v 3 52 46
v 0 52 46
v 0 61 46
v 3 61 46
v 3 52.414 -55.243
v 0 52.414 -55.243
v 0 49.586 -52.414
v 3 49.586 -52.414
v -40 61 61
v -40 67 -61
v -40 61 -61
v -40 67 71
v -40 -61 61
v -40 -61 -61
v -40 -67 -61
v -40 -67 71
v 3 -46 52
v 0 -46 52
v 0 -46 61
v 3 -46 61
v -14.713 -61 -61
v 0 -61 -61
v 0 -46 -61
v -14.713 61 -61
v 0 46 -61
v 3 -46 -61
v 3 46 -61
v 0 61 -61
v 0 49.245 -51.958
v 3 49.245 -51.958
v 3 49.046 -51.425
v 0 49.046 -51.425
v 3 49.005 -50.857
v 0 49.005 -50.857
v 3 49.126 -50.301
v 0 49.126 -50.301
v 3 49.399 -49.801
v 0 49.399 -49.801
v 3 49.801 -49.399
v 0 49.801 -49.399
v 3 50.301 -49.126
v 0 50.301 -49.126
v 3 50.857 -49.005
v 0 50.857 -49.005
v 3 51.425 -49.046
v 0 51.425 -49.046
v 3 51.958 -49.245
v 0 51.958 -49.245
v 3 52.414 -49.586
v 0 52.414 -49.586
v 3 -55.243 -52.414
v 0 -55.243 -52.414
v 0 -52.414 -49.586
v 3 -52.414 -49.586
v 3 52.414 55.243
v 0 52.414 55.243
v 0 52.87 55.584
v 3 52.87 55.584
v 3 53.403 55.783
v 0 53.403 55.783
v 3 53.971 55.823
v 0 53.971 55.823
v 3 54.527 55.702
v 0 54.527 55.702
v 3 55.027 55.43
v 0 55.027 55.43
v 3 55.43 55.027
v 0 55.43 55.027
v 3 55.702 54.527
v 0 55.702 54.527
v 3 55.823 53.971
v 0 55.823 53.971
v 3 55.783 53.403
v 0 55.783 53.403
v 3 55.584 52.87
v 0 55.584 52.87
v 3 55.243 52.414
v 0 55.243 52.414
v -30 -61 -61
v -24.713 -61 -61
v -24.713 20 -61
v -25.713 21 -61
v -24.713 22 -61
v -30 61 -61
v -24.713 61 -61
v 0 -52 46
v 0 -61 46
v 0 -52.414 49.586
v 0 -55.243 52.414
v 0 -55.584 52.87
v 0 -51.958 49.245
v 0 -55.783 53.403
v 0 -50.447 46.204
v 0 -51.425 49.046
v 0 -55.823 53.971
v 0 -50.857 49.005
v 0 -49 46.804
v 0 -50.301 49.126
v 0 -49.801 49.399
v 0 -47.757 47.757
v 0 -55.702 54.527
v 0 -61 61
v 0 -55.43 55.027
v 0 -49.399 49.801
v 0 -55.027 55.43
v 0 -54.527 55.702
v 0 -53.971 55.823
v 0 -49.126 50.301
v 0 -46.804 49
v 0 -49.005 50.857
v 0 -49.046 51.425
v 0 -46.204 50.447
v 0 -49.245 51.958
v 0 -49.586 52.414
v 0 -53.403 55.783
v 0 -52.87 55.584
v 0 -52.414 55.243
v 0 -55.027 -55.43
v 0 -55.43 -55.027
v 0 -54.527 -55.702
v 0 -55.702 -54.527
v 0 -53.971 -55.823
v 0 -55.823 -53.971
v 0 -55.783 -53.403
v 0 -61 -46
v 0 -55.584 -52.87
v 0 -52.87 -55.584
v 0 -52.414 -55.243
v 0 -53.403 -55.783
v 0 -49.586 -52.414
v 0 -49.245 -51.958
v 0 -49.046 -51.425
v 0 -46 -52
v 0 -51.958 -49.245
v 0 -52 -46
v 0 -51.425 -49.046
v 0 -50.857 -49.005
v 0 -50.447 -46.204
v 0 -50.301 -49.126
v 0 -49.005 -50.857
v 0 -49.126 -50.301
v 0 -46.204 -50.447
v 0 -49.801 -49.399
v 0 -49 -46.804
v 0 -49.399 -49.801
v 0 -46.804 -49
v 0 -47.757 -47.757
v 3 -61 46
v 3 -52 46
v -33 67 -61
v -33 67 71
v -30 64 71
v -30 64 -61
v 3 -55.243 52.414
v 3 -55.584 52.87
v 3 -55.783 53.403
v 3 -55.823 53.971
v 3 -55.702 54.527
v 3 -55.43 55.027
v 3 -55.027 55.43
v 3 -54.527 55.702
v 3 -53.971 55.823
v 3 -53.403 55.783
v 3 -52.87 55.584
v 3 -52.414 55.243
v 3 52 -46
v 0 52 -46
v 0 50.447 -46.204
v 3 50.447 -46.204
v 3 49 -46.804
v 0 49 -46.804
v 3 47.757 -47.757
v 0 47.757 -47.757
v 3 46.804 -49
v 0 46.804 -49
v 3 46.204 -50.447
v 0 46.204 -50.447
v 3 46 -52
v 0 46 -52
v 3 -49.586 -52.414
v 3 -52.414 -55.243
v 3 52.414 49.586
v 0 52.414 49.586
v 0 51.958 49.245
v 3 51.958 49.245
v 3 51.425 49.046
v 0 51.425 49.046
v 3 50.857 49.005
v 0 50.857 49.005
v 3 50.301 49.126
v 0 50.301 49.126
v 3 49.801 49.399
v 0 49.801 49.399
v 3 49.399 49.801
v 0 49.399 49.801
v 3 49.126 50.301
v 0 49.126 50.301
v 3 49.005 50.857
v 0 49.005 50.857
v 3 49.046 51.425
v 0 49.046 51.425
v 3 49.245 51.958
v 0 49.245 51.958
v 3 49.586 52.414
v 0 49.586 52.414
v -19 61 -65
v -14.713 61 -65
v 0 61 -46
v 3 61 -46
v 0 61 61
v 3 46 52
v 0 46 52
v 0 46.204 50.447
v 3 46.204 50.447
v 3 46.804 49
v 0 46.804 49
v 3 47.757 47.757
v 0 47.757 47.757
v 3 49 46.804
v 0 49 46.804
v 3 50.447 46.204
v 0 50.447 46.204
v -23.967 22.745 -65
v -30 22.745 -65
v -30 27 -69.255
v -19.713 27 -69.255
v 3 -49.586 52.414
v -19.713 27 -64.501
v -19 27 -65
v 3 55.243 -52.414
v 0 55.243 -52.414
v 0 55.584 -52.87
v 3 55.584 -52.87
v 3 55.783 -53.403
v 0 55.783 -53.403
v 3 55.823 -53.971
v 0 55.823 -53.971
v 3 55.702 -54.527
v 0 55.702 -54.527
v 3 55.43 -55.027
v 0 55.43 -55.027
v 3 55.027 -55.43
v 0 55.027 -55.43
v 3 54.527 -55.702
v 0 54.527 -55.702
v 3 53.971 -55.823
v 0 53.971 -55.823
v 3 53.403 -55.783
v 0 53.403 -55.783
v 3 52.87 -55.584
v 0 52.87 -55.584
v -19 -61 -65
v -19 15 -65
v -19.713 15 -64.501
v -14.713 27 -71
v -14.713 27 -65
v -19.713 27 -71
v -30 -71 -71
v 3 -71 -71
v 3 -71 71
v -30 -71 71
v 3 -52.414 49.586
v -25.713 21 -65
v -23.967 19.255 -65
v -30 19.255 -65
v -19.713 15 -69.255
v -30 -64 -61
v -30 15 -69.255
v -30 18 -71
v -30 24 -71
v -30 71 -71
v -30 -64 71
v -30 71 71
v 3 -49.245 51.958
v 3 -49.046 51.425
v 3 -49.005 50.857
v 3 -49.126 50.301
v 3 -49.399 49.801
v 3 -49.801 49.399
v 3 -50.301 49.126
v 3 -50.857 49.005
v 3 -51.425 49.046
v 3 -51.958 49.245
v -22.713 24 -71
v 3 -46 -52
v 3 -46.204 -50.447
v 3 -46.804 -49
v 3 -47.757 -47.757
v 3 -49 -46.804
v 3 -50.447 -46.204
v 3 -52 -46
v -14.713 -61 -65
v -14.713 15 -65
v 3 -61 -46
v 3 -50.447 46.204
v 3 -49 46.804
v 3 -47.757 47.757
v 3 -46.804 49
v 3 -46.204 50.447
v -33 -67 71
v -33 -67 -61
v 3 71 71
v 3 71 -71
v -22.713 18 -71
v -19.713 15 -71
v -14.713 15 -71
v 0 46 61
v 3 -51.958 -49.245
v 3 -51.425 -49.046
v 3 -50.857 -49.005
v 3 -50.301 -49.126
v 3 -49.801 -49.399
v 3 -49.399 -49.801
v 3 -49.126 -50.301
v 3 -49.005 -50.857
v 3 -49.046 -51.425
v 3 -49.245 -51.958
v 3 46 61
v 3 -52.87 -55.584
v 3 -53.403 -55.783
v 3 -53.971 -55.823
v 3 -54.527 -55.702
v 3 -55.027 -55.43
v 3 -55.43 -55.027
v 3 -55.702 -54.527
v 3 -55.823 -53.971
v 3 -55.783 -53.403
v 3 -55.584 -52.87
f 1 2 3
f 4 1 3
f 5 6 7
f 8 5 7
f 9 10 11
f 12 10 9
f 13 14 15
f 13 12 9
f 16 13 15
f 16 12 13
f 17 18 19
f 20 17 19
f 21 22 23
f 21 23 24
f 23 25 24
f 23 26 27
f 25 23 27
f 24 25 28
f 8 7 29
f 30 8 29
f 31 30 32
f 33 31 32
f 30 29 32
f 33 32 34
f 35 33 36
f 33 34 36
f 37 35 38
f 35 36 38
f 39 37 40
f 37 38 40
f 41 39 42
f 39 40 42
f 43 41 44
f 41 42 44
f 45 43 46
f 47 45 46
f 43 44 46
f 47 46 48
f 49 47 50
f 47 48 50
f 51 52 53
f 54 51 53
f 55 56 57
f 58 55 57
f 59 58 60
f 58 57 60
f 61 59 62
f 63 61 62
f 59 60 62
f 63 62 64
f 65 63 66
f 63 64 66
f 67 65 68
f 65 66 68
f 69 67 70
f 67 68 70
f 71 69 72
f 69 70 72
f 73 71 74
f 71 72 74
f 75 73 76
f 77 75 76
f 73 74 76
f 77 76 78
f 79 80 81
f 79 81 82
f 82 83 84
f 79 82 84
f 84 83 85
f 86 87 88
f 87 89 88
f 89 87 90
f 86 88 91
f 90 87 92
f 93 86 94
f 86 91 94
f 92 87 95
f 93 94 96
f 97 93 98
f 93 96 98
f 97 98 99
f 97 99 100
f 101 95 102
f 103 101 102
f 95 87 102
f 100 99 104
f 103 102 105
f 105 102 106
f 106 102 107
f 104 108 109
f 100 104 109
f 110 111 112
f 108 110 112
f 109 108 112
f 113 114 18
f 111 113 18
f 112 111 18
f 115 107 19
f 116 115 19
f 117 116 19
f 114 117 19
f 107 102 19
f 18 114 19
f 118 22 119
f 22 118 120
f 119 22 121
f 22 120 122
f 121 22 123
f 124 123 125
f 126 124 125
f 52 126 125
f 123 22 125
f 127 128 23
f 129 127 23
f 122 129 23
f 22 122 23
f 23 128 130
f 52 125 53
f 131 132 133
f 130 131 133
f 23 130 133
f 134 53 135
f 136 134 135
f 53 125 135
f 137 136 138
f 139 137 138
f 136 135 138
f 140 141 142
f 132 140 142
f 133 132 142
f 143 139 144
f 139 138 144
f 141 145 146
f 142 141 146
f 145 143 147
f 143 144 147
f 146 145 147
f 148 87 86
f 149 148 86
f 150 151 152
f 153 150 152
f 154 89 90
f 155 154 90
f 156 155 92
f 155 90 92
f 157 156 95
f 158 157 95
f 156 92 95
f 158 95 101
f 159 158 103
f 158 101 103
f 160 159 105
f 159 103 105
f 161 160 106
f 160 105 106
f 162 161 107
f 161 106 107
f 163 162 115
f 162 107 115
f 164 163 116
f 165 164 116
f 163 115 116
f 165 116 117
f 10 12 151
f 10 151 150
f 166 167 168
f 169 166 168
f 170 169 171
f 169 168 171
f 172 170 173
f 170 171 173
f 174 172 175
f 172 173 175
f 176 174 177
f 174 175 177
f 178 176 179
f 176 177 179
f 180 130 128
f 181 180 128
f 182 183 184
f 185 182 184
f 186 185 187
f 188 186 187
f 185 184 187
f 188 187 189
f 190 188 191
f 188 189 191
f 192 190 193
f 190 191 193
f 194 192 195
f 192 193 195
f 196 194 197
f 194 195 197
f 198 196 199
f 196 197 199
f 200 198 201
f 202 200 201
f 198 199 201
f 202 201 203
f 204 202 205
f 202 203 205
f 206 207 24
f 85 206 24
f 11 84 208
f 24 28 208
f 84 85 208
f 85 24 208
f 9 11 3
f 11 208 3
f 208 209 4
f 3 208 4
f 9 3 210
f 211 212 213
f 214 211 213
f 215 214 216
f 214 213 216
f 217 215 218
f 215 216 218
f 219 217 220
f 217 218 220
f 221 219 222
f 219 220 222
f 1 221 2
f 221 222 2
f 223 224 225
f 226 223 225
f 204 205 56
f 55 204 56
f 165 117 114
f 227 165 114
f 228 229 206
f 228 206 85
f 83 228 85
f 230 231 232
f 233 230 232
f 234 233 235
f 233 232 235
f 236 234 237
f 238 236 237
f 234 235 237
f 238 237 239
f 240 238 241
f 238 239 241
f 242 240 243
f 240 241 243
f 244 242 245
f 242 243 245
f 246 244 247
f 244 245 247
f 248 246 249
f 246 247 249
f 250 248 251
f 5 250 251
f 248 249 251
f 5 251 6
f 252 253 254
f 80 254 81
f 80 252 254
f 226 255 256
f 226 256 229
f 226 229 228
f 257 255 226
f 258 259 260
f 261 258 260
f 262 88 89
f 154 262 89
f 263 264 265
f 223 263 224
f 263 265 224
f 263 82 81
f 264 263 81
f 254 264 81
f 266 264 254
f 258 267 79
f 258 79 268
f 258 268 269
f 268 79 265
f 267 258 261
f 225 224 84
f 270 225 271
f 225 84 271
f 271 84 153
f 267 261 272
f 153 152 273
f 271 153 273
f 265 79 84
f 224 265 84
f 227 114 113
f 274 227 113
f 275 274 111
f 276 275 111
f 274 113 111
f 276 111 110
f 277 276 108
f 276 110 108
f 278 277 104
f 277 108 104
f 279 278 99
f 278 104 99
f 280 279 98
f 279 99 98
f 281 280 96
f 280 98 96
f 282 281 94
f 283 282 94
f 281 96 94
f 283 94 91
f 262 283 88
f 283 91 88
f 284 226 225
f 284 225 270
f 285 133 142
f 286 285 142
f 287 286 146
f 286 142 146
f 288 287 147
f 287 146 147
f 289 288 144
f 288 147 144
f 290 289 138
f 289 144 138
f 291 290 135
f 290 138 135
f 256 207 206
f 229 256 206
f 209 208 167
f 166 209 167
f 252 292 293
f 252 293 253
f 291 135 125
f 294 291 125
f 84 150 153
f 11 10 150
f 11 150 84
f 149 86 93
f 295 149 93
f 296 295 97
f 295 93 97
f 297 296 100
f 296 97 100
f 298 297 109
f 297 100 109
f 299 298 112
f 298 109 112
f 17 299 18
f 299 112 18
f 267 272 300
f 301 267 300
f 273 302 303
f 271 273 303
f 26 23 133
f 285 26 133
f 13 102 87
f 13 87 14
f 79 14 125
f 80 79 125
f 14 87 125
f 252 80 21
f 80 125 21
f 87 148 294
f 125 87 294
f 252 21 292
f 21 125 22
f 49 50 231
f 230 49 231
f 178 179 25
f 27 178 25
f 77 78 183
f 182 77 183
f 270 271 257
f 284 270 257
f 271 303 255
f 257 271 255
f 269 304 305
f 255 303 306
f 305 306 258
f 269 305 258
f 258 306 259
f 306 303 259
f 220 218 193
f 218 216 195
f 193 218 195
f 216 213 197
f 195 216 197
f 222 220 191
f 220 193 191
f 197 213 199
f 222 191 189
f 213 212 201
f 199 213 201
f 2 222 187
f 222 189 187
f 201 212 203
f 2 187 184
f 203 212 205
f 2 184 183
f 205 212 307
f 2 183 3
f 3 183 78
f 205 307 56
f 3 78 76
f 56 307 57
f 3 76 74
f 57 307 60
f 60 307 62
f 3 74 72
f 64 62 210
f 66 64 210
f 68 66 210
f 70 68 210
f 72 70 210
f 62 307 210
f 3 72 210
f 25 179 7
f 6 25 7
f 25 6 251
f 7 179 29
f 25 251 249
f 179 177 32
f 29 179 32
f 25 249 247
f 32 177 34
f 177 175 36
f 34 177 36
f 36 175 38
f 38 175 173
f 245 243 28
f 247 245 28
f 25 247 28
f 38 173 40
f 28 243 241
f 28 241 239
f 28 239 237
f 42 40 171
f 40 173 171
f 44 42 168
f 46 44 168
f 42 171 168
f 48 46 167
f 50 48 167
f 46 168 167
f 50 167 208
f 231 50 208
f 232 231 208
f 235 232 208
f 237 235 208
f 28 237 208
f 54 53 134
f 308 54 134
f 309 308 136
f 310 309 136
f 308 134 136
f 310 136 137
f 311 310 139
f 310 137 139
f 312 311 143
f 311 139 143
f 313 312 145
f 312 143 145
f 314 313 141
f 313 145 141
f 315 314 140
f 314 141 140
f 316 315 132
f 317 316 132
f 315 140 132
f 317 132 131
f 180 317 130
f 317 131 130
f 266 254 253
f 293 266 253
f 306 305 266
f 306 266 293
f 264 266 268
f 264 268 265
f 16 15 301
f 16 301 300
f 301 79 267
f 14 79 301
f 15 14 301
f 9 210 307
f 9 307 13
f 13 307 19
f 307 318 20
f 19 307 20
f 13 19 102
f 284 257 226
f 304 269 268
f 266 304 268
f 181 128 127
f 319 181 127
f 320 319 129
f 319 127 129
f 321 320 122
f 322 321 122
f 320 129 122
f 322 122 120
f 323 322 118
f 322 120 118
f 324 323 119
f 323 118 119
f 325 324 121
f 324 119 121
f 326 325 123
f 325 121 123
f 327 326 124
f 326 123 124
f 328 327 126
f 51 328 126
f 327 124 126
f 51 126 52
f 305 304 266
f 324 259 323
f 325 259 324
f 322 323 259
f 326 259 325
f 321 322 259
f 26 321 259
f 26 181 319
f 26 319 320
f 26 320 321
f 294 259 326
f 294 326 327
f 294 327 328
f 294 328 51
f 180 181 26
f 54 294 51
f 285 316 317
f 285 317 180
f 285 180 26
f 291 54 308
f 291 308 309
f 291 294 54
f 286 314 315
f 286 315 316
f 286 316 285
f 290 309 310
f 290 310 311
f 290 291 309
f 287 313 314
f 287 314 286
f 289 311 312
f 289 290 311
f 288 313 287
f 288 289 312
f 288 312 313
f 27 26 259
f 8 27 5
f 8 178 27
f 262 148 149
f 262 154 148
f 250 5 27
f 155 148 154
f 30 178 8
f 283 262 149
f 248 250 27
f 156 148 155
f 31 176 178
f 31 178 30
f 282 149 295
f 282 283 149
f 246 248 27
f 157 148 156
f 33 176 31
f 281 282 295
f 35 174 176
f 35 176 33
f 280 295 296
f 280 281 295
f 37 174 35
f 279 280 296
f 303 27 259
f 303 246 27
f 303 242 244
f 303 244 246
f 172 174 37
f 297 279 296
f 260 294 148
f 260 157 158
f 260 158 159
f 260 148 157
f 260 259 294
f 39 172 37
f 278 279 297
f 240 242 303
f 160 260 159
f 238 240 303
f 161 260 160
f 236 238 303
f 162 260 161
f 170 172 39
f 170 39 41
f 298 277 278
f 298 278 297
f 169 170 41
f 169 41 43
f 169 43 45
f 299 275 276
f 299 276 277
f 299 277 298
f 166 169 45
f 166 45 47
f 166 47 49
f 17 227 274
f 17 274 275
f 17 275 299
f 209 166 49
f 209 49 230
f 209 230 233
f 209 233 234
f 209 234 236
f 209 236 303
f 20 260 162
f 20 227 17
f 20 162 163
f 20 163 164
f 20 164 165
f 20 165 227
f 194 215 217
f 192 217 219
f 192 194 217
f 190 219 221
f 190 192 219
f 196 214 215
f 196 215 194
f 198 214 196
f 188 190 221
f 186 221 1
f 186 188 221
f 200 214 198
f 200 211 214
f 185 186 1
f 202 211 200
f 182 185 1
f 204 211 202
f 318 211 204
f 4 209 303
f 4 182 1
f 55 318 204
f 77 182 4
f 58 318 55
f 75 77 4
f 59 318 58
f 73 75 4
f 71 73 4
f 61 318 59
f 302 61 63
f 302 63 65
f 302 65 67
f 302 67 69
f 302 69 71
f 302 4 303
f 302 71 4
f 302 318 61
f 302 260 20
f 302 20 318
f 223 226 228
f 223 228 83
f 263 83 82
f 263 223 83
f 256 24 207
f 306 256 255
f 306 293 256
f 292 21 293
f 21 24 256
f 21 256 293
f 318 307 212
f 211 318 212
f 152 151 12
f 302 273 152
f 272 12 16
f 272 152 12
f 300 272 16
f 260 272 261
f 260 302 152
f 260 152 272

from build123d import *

# Parameters (mm, degrees)
SKETCH2_W           = 142
SKETCH2_H           = 142
SKETCH2_W_2         = 122
SKETCH2_H_2         = 122
BOSS_EXTRUDE1_DEPTH = 3
SKETCH2_4_W         = 142
SKETCH2_4_H         = 142
SKETCH2_4_W_2       = 122
SKETCH2_4_H_2       = 122
BOSS_EXTRUDE2_DEPTH = 30
BOSS_EXTRUDE3_DEPTH = 10
CUT_EXTRUDE5_START  = -132
CUT_EXTRUDE5_DEPTH  = 122
SKETCH15_W          = 122
SKETCH15_H          = 10
BOSS_EXTRUDE4_DEPTH = 10
CAVITY2_START       = -40
CAVITY2_DEPTH       = 10
CAVITY2_START_2     = -61
CAVITY2_2_DEPTH     = 133
CUT_EXTRUDE8_DEPTH  = 25.287407973
CUT_EXTRUDE9_START  = -6
CUT_EXTRUDE9_DEPTH  = 10


with BuildPart() as part:
    # Sketch2 → Boss-Extrude1 (new body)
    # profile 1 of 5: a face of its own
    with BuildSketch(Plane.YZ):
        Rectangle(SKETCH2_W, SKETCH2_H)
        Rectangle(SKETCH2_W_2, SKETCH2_H_2, mode=Mode.SUBTRACT)
    # profile 2 of 5: a face of its own
    with BuildSketch(Plane.YZ):
        with BuildLine():
            Line((-61, 61), (-61, 46))
            Line((-61, 46), (-52, 46))
            ThreePointArc((-52, 46), (-47.757359313, 47.757359313), (-46, 52))
            Line((-46, 52), (-46, 61))
            Line((-46, 61), (-61, 61))
        make_face()
        with BuildLine():
            ThreePointArc((-49.585786438, 52.414213562), (-49.585786438, 49.585786438), (-52.414213562, 49.585786438))
            Line((-52.414213562, 49.585786438), (-55.242640687, 52.414213562))
            ThreePointArc((-55.242640687, 52.414213562), (-55.242640687, 55.242640687), (-52.414213562, 55.242640687))
            Line((-52.414213562, 55.242640687), (-49.585786438, 52.414213562))
        make_face(mode=Mode.SUBTRACT)
    # profile 3 of 5: a face of its own
    with BuildSketch(Plane.YZ):
        with BuildLine():
            Line((52, 46), (61, 46))
            Line((61, 46), (61, 61))
            Line((61, 61), (46, 61))
            Line((46, 61), (46, 52))
            ThreePointArc((46, 52), (47.757359313, 47.757359313), (52, 46))
        make_face()
        with BuildLine():
            ThreePointArc((52.414213562, 49.585786438), (49.585786438, 49.585786438), (49.585786438, 52.414213562))
            Line((49.585786438, 52.414213562), (52.414213562, 55.242640687))
            ThreePointArc((52.414213562, 55.242640687), (55.242640687, 55.242640687), (55.242640687, 52.414213562))
            Line((55.242640687, 52.414213562), (52.414213562, 49.585786438))
        make_face(mode=Mode.SUBTRACT)
    # profile 4 of 5: a face of its own
    with BuildSketch(Plane.YZ):
        with BuildLine():
            Line((46, -52), (46, -61))
            Line((46, -61), (61, -61))
            Line((61, -61), (61, -46))
            Line((61, -46), (52, -46))
            ThreePointArc((52, -46), (47.757359313, -47.757359313), (46, -52))
        make_face()
        with BuildLine():
            ThreePointArc((49.585786438, -52.414213562), (49.585786438, -49.585786438), (52.414213562, -49.585786438))
            Line((52.414213562, -49.585786438), (55.242640687, -52.414213562))
            ThreePointArc((55.242640687, -52.414213562), (55.242640687, -55.242640687), (52.414213562, -55.242640687))
            Line((52.414213562, -55.242640687), (49.585786438, -52.414213562))
        make_face(mode=Mode.SUBTRACT)
    # profile 5 of 5: a face of its own
    with BuildSketch(Plane.YZ):
        with BuildLine():
            Line((-61, -46), (-61, -61))
            Line((-61, -61), (-46, -61))
            Line((-46, -61), (-46, -52))
            ThreePointArc((-46, -52), (-47.757359313, -47.757359313), (-52, -46))
            Line((-52, -46), (-61, -46))
        make_face()
        with BuildLine():
            ThreePointArc((-52.414213562, -49.585786438), (-49.585786438, -49.585786438), (-49.585786438, -52.414213562))
            Line((-49.585786438, -52.414213562), (-52.414213562, -55.242640687))
            ThreePointArc((-52.414213562, -55.242640687), (-55.242640687, -55.242640687), (-55.242640687, -52.414213562))
            Line((-55.242640687, -52.414213562), (-52.414213562, -49.585786438))
        make_face(mode=Mode.SUBTRACT)
    extrude(amount=BOSS_EXTRUDE1_DEPTH)

    # Sketch2<4> → Boss-Extrude2 (add)
    with BuildSketch(Plane.YZ):
        Rectangle(SKETCH2_4_W, SKETCH2_4_H)
        Rectangle(SKETCH2_4_W_2, SKETCH2_4_H_2, mode=Mode.SUBTRACT)
    extrude(amount=-BOSS_EXTRUDE2_DEPTH)

    # Sketch3 → Boss-Extrude3 (add)
    with BuildSketch(Plane(origin=(-30, 0, 0), x_dir=(0, -1, 0), z_dir=(-1, 0, 0))):
        Polygon((-61, -61), (-61, 61), (-61, 71), (-71, 71), (-71, -71), (71, -71), (71, 71), (61, 71), (61, 61), (61, -61), align=None)
    extrude(amount=BOSS_EXTRUDE3_DEPTH)

    # Sketch11 → Cut-Extrude5 (cut)
    with BuildSketch(Plane(origin=(0, 71, 0), x_dir=(-1, 0, 0), z_dir=(0, 1, 0)).offset(CUT_EXTRUDE5_START)):
        Polygon((14.712592027, -65), (19, -65), (24.712592027, -61), (14.712592027, -61), align=None)
    extrude(amount=CUT_EXTRUDE5_DEPTH, mode=Mode.SUBTRACT)

    # Sketch15 → Boss-Extrude4 (add)
    with BuildSketch(Plane(origin=(-30, 0, 0), x_dir=(0, -1, 0), z_dir=(-1, 0, 0))):
        with Locations((0, 66)):
            Rectangle(SKETCH15_W, SKETCH15_H)
    extrude(amount=BOSS_EXTRUDE4_DEPTH)

    # Cavity2: read off the stored shape, not the designer's step
    # Cavity2 outline → Cavity2 (cut)
    with BuildSketch(Plane.YZ.offset(CAVITY2_START)):
        Polygon((19.254896882, -65), (22.745103118, -65), (27, -69.254896882), (24, -71), (71, -71), (71, 71), (67, 71), (67, -61), (-67, -61), (-67, 71), (-71, 71), (-71, -71), (18, -71), (15, -69.254896882), align=None)
    extrude(amount=CAVITY2_DEPTH, mode=Mode.SUBTRACT)

    # Cavity2 2 outline → Cavity2 2 (cut)
    with BuildSketch(Plane.XY.offset(CAVITY2_START_2)):
        Polygon((-30, -67), (-30, -64), (-33, -67), align=None)
        Polygon((-30, 64), (-30, 67), (-33, 67), align=None)
    extrude(amount=CAVITY2_2_DEPTH, mode=Mode.SUBTRACT)

    # Sketch16 → Cut-Extrude8 (cut)
    with BuildSketch(Plane(origin=(-40, 0, 0), x_dir=(0, -1, 0), z_dir=(-1, 0, 0))):
        Polygon((-22.745103118, -65), (-27, -69.254896882), (-24, -71), (-18, -71), (-15, -69.254896882), (-19.254896882, -65), align=None)
    extrude(amount=-CUT_EXTRUDE8_DEPTH, mode=Mode.SUBTRACT)

    # Sketch14 → Cut-Extrude9 (cut)
    with BuildSketch(Plane.XY.offset(-65).offset(CUT_EXTRUDE9_START)):
        Polygon((-19.712592027, 15), (-14.712592027, 15), (-14.712592027, 27), (-19.712592027, 27), (-25.712592027, 21), align=None)
    extrude(amount=CUT_EXTRUDE9_DEPTH, mode=Mode.SUBTRACT)


solid = part.part
